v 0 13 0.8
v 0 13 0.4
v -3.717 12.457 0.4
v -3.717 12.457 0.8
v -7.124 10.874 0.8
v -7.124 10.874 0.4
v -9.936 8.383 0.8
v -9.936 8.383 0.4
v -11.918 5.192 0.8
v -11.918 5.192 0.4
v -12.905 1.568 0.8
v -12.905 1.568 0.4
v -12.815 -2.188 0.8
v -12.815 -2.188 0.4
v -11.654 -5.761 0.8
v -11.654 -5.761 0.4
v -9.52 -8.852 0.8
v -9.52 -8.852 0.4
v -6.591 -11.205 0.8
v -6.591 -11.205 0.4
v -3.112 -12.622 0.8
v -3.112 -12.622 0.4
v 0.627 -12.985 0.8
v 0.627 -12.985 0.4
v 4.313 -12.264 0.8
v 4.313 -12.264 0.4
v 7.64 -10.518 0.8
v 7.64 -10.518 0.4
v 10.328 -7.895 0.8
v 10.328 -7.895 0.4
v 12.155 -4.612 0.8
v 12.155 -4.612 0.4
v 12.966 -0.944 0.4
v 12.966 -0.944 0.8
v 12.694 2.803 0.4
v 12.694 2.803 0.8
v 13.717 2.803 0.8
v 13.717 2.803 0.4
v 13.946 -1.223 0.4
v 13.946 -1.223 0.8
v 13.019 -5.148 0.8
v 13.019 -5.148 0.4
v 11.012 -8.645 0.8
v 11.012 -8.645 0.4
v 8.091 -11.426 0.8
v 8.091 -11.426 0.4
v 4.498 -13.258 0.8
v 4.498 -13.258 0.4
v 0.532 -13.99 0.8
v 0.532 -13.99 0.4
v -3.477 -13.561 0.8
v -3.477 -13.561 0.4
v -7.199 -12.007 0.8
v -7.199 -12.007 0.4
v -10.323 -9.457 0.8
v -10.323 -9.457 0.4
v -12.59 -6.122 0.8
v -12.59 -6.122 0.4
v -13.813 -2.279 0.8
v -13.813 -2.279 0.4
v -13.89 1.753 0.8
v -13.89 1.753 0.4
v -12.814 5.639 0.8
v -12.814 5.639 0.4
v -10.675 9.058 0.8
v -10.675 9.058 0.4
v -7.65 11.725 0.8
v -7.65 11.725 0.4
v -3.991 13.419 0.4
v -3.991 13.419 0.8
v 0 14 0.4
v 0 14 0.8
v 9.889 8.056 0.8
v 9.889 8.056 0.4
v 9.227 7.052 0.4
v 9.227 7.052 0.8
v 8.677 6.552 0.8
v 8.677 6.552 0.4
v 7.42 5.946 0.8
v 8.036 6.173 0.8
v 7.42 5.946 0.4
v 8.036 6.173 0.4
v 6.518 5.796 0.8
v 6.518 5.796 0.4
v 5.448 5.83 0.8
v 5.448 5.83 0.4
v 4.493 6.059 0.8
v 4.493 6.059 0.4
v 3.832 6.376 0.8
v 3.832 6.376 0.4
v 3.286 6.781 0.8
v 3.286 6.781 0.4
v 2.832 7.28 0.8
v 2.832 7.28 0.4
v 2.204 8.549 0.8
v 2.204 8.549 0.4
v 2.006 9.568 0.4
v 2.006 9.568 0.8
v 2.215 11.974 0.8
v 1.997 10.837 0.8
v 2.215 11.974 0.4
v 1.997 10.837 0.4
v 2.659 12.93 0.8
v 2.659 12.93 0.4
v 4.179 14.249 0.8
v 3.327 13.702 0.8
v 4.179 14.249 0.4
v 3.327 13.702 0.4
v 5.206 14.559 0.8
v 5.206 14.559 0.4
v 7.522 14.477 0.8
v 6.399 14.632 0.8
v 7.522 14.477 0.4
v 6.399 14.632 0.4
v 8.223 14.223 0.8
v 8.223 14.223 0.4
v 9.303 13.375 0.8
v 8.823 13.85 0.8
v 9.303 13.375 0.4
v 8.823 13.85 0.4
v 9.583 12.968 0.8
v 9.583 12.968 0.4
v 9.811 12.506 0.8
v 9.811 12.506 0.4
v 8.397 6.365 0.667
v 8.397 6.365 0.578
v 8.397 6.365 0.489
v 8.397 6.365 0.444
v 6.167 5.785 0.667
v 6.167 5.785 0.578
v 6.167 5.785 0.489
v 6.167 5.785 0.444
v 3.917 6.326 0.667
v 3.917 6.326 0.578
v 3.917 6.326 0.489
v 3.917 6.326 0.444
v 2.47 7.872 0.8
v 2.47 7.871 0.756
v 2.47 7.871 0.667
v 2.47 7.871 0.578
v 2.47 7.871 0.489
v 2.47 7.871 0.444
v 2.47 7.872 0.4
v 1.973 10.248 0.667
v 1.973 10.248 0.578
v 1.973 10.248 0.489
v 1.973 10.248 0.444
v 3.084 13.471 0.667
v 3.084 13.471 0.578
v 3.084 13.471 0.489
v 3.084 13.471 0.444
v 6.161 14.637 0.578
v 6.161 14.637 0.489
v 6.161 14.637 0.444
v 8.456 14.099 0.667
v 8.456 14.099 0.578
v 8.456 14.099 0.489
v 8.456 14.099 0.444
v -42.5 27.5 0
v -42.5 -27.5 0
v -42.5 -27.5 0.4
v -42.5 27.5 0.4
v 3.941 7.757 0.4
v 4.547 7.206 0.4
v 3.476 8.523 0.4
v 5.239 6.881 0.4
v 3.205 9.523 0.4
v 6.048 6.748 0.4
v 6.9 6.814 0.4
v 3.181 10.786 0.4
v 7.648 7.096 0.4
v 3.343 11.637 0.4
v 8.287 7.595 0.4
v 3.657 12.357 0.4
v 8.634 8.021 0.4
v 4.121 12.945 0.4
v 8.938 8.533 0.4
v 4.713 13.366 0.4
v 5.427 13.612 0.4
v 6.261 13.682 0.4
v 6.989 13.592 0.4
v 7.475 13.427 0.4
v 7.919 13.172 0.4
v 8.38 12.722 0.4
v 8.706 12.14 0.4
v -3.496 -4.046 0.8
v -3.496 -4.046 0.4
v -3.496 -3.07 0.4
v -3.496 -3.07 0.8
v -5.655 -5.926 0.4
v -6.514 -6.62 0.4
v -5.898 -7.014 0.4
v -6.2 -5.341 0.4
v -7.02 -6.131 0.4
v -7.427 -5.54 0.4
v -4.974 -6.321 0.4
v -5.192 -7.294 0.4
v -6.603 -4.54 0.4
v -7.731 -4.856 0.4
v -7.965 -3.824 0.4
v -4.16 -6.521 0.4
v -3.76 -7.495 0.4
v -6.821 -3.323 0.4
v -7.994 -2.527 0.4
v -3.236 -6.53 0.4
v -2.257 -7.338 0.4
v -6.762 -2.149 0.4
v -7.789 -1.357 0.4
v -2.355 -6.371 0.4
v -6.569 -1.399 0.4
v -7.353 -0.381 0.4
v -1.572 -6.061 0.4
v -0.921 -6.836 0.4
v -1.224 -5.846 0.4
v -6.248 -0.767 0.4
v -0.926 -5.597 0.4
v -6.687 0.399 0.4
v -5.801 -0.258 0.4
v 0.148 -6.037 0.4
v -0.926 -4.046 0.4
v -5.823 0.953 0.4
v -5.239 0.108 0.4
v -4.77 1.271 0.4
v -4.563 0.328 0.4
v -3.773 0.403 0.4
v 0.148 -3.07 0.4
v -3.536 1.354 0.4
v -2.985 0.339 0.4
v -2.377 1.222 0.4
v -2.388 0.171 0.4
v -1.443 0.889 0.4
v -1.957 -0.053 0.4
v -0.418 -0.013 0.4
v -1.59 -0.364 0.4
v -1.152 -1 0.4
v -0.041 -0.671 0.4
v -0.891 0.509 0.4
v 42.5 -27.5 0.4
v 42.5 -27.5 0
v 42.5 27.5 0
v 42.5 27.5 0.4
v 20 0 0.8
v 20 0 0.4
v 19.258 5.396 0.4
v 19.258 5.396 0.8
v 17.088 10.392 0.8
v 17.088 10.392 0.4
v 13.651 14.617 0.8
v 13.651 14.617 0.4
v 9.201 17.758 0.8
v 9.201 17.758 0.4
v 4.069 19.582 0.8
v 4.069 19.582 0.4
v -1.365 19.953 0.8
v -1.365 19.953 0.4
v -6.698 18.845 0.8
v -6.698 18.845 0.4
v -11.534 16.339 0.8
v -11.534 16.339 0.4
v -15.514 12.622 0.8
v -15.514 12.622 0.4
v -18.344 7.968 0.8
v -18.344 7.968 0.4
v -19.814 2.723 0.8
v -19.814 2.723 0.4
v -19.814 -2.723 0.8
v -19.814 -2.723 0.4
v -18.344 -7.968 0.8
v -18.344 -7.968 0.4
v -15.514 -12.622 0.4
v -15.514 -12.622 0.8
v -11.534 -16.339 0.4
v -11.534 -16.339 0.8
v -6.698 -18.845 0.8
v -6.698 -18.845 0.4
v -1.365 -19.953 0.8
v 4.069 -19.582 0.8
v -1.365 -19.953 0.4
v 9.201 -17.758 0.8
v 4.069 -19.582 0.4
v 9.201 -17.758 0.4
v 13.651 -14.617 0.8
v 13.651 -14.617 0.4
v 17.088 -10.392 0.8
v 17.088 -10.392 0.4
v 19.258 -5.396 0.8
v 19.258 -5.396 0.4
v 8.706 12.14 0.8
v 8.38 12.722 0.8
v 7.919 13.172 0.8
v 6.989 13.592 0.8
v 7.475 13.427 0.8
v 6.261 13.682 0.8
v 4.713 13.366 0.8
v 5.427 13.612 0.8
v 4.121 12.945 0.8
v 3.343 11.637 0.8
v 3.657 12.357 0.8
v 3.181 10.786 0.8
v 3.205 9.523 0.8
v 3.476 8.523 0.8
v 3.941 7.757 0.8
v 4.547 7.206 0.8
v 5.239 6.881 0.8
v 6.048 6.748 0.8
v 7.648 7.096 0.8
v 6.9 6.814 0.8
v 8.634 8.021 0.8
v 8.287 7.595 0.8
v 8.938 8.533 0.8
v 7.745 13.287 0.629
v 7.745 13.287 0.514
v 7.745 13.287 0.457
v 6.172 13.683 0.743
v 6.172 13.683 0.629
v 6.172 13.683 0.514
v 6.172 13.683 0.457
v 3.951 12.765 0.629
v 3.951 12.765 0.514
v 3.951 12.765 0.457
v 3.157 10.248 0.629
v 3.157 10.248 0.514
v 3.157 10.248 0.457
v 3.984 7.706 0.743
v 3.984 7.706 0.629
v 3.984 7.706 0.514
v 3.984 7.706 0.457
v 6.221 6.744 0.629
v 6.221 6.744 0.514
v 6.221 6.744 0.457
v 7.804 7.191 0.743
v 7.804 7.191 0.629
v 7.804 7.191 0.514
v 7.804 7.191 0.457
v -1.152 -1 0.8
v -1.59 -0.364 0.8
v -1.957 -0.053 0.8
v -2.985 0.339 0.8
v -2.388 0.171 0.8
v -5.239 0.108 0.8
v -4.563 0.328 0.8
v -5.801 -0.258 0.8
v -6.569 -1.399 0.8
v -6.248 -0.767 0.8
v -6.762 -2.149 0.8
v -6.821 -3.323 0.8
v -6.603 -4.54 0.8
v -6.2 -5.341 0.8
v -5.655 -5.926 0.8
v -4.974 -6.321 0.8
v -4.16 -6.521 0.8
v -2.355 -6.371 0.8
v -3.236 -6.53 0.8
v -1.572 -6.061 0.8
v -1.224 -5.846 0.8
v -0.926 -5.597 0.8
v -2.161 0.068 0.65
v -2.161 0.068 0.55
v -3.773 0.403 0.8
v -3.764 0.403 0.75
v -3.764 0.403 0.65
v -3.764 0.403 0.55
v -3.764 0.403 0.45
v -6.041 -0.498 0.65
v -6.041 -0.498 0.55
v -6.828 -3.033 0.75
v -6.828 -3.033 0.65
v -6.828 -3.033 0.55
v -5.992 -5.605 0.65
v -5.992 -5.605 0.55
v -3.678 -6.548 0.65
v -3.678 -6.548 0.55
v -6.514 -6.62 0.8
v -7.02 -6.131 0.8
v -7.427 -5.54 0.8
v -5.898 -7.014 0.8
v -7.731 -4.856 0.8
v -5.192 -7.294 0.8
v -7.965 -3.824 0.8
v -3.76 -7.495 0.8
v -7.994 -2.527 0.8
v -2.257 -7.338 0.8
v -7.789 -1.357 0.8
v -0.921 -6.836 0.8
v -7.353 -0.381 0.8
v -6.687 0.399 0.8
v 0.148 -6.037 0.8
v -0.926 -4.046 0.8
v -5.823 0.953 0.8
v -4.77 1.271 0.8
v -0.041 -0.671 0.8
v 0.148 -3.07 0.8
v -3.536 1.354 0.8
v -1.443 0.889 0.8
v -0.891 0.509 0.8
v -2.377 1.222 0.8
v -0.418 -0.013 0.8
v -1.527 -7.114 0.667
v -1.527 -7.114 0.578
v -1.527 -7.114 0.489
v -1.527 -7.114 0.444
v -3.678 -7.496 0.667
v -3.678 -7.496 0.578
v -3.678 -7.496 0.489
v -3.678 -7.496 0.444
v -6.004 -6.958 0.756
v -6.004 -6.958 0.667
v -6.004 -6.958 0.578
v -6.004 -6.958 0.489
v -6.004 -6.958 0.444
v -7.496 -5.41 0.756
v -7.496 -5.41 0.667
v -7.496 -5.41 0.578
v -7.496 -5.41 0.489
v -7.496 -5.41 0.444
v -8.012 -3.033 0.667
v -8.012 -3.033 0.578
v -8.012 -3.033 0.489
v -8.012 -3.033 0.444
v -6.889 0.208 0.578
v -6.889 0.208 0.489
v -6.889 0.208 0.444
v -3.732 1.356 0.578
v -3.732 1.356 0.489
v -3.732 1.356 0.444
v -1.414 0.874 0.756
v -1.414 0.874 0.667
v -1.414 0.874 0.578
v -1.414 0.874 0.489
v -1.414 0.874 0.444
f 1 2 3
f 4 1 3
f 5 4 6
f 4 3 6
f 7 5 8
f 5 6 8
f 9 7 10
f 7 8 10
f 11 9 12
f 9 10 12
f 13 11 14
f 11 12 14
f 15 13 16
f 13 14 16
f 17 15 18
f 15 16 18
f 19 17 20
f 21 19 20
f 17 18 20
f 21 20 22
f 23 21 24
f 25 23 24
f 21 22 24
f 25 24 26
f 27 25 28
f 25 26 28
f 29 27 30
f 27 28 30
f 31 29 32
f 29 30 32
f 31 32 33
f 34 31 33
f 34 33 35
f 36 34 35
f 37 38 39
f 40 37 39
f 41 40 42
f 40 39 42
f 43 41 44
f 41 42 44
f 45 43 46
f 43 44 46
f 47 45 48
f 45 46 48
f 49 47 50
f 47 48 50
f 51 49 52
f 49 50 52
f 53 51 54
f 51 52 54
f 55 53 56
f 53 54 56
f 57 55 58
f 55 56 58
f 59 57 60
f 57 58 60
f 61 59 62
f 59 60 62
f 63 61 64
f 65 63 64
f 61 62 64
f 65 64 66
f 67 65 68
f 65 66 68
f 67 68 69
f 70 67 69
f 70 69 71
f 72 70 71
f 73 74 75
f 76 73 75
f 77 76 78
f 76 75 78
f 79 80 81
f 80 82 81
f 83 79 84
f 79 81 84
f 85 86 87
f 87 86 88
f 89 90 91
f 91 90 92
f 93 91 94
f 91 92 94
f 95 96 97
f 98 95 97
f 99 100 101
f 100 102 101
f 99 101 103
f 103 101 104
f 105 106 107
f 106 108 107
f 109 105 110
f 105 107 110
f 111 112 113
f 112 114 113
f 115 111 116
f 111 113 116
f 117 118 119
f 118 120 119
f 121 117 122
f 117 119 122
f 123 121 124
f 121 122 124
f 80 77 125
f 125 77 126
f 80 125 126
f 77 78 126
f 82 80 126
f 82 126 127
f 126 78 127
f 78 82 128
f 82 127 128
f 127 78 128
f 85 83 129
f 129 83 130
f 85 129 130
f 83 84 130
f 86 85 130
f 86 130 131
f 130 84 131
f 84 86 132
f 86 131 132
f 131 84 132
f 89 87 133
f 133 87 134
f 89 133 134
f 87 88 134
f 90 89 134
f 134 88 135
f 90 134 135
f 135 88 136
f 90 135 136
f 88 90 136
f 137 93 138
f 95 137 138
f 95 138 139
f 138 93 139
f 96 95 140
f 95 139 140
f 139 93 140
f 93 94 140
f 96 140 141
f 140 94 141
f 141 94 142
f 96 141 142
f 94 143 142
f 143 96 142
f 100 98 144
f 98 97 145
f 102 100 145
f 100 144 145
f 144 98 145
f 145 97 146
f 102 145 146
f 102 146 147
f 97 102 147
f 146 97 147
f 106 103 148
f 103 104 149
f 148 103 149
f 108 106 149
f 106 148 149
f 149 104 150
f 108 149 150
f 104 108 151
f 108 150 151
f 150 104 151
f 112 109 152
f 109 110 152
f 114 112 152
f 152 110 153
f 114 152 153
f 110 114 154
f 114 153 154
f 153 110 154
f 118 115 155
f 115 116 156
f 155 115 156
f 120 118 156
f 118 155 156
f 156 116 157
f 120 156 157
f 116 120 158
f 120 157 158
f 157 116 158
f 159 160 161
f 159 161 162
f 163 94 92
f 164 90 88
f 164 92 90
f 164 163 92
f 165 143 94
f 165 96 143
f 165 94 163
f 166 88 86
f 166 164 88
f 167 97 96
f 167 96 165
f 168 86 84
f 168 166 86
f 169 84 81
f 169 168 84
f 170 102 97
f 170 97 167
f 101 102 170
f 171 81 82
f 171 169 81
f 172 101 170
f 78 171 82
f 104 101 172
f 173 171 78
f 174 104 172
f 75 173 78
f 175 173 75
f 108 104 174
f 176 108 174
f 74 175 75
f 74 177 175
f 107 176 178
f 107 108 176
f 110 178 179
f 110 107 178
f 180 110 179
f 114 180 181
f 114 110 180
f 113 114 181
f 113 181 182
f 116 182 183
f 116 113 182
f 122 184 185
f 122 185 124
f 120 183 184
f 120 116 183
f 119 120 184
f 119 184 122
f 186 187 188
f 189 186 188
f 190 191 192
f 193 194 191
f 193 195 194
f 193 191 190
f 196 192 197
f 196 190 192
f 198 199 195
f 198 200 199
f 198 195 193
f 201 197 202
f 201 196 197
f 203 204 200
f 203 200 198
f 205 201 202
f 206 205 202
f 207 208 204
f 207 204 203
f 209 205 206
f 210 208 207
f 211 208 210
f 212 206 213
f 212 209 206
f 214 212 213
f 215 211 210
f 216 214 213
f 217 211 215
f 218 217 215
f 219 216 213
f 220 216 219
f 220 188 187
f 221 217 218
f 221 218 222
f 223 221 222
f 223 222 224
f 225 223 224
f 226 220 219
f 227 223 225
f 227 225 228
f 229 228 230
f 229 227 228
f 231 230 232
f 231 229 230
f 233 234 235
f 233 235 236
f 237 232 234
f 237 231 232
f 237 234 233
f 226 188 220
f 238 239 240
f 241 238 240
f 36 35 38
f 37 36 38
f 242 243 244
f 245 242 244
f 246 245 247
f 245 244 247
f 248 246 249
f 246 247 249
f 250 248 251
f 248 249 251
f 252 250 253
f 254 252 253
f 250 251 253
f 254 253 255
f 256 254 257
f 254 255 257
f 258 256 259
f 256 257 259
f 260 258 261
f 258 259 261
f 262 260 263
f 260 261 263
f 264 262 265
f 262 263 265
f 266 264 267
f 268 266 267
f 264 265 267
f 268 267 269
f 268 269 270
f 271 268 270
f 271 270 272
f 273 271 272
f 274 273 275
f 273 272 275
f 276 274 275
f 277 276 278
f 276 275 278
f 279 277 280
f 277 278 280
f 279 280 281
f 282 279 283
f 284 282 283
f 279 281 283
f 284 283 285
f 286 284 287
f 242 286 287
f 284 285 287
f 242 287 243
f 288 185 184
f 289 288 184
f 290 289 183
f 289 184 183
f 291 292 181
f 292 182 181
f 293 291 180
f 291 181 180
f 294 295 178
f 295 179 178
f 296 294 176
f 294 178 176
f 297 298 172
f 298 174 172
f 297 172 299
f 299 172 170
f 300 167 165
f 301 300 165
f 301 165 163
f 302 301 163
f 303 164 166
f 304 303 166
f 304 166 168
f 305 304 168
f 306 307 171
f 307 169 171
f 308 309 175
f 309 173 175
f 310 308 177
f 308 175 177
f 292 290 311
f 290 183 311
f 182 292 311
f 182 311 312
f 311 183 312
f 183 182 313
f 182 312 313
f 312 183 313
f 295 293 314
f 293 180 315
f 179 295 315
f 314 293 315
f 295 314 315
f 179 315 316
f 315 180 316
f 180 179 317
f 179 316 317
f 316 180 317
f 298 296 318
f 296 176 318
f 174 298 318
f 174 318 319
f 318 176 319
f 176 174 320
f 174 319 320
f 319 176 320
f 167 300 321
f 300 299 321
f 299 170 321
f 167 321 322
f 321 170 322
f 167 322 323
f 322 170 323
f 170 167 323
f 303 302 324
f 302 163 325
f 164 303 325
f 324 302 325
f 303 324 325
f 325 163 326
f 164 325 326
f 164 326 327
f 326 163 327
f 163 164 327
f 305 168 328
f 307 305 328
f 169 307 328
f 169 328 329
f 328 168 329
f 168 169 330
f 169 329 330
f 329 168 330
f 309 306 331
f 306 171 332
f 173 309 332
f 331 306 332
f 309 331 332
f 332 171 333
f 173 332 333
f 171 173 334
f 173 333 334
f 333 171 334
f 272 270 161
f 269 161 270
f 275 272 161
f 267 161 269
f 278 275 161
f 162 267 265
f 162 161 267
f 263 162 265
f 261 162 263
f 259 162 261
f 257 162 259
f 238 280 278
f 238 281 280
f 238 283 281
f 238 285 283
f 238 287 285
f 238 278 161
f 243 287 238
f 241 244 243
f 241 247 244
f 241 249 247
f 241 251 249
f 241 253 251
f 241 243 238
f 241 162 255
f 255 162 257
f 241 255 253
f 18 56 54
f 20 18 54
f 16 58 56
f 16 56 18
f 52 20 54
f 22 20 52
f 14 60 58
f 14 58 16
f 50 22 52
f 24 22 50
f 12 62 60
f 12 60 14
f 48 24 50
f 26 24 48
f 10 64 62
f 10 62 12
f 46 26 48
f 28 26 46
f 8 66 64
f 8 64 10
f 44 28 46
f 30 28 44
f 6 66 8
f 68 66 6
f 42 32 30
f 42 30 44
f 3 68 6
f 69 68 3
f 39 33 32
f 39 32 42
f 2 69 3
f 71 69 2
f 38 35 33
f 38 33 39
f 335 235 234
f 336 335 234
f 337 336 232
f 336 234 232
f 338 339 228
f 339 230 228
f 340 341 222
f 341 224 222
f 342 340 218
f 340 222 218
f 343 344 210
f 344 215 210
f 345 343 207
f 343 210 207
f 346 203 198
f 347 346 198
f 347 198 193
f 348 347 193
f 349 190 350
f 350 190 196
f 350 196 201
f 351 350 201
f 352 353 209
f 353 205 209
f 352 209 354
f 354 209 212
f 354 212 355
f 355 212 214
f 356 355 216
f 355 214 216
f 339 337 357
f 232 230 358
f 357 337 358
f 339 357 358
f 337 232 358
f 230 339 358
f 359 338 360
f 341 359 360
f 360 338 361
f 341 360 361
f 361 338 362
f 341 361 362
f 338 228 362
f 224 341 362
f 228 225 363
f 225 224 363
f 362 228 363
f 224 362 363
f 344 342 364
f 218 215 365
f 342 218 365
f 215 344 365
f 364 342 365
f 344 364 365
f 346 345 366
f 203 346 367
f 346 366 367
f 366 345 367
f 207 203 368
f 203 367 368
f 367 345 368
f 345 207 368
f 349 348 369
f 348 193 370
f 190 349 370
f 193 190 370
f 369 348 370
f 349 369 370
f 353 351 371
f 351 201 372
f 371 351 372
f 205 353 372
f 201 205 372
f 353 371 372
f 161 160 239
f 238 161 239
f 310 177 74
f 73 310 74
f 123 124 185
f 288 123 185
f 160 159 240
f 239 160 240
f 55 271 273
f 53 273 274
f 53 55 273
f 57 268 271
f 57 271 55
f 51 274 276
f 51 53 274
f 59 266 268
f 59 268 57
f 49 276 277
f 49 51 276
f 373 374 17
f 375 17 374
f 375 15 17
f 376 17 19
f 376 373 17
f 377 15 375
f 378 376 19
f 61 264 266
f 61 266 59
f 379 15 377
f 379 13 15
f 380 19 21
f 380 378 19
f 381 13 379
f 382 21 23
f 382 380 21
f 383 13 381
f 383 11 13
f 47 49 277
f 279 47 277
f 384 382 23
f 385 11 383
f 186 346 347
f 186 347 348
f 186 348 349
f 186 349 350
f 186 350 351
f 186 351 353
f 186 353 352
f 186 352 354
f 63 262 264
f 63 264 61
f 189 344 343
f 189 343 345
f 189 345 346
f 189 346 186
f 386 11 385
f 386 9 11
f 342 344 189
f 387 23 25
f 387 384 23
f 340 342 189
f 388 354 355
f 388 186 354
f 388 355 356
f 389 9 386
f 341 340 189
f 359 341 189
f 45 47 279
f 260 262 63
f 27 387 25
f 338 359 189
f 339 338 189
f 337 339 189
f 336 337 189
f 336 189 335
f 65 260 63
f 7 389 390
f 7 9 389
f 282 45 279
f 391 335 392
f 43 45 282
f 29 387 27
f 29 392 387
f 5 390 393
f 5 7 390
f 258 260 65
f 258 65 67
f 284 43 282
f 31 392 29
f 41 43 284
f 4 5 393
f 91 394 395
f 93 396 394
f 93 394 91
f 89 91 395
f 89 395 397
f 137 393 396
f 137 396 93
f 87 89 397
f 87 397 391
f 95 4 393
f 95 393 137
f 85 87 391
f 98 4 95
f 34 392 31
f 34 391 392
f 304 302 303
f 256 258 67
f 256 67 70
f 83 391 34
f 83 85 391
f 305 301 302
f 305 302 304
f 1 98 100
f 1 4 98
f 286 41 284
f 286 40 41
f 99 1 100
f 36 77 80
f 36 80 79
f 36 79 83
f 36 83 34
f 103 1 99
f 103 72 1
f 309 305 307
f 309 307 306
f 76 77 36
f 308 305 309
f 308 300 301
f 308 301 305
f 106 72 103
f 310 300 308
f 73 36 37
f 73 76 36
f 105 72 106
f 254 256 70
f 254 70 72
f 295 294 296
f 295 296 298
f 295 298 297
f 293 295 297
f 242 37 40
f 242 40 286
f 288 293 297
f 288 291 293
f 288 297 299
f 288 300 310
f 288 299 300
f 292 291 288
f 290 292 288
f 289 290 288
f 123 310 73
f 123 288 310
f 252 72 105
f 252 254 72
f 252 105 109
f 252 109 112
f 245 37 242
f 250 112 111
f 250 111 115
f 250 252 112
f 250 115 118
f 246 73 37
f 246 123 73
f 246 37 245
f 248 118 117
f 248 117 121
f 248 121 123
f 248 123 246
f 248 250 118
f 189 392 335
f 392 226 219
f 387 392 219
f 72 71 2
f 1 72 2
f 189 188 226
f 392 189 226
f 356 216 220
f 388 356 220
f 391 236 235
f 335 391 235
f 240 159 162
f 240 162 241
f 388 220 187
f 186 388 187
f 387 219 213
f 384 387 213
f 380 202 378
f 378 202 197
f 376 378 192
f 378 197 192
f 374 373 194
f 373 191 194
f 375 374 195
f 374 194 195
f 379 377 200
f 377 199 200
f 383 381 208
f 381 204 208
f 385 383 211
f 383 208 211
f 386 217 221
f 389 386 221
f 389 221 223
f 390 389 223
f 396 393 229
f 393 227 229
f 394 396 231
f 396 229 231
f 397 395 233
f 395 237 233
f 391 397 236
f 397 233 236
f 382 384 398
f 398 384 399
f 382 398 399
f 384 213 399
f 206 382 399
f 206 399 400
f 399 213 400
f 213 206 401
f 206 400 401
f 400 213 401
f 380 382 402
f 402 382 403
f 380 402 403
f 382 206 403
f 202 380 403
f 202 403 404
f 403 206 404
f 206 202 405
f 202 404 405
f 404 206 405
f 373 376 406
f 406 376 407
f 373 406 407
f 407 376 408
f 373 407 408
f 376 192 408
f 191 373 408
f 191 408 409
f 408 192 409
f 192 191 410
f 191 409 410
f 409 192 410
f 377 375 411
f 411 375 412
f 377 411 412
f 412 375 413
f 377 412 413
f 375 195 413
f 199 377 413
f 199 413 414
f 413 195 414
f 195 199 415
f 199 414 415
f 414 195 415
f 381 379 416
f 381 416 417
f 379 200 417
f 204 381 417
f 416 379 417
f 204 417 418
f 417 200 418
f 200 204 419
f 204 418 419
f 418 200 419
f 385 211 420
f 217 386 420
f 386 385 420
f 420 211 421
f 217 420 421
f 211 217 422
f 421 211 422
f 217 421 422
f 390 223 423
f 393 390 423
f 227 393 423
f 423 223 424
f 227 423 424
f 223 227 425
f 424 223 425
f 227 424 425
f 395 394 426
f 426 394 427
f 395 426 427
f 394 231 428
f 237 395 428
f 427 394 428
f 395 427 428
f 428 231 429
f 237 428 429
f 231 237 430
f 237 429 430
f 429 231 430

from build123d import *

# Parameters (mm, degrees)
F0_W     = 85
F0_H     = 55
F1_DEPTH = 0.4
F2_R     = 20
F3_DEPTH = 0.4


with BuildPart() as f1:
    # F0 (on Top) → F1 (new body)
    with BuildSketch(Plane.XY):
        Rectangle(F0_W, F0_H)
    extrude(amount=F1_DEPTH)

    # F2 (on face) → F3 (join)
    with BuildSketch(Plane.XY.offset(0.4)):
        Circle(F2_R)
        with BuildLine():
            add(Edge.make_bspline(
                [(-7.4961080118, -5.409697216), (-8.0117330118, -4.399931591), (-8.0117330118, -3.032744091)],
                knots=[0, 0, 0, 1, 1, 1], degree=2))
            add(Edge.make_bspline(
                [(-8.0117330118, -3.032744091), (-8.0117330118, -0.938994091), (-6.8886861368, 0.2084668465)],
                knots=[0, 0, 0, 1, 1, 1], degree=2))
            add(Edge.make_bspline(
                [(-6.8886861368, 0.2084668465), (-5.7656392618, 1.355927784), (-3.7324361368, 1.355927784)],
                knots=[0, 0, 0, 1, 1, 1], degree=2))
            add(Edge.make_bspline(
                [(-3.7324361368, 1.355927784), (-2.3047017618, 1.355927784), (-1.4140767618, 0.873505909)],
                knots=[0, 0, 0, 1, 1, 1], degree=2))
            add(Edge.make_bspline(
                [(-1.4140767618, 0.873505909), (-0.5234517618, 0.391084034), (-0.0410298868, -0.671415966)],
                knots=[0, 0, 0, 1, 1, 1], degree=2))
            Line((-0.0410298868, -0.671415966), (-1.1523580118, -0.999540966))
            add(Edge.make_bspline(
                [(-1.1523580118, -0.999540966), (-1.5175923868, -0.267119091), (-2.1611470743, 0.0678418465)],
                knots=[0, 0, 0, 1, 1, 1], degree=2))
            add(Edge.make_bspline(
                [(-2.1611470743, 0.0678418465), (-2.8047017618, 0.402802784), (-3.7636861368, 0.402802784)],
                knots=[0, 0, 0, 1, 1, 1], degree=2))
            add(Edge.make_bspline(
                [(-3.7636861368, 0.402802784), (-5.2539205118, 0.402802784), (-6.0410298868, -0.497587841)],
                knots=[0, 0, 0, 1, 1, 1], degree=2))
            add(Edge.make_bspline(
                [(-6.0410298868, -0.497587841), (-6.8281392618, -1.397978466), (-6.8281392618, -3.032744091)],
                knots=[0, 0, 0, 1, 1, 1], degree=2))
            add(Edge.make_bspline(
                [(-6.8281392618, -3.032744091), (-6.8281392618, -4.661650341), (-5.9922017618, -5.605009716)],
                knots=[0, 0, 0, 1, 1, 1], degree=2))
            add(Edge.make_bspline(
                [(-5.9922017618, -5.605009716), (-5.1562642618, -6.548369091), (-3.6777486368, -6.548369091)],
                knots=[0, 0, 0, 1, 1, 1], degree=2))
            add(Edge.make_bspline(
                [(-3.6777486368, -6.548369091), (-2.8359517618, -6.548369091), (-2.1064595743, -6.292509716)],
                knots=[0, 0, 0, 1, 1, 1], degree=2))
            add(Edge.make_bspline(
                [(-2.1064595743, -6.292509716), (-1.3769673868, -6.036650341), (-0.9257955118, -5.597197216)],
                knots=[0, 0, 0, 1, 1, 1], degree=2))
            Line((-0.9257955118, -5.597197216), (-0.9257955118, -4.046415966))
            Line((-0.9257955118, -4.046415966), (-3.4961080118, -4.046415966))
            Line((-3.4961080118, -4.046415966), (-3.4961080118, -3.069853466))
            Line((-3.4961080118, -3.069853466), (0.1484232382, -3.069853466))
            Line((0.1484232382, -3.069853466), (0.1484232382, -6.036650341))
            add(Edge.make_bspline(
                [(0.1484232382, -6.036650341), (-0.5351705118, -6.731962841), (-1.5273580118, -7.1137987785)],
                knots=[0, 0, 0, 1, 1, 1], degree=2))
            add(Edge.make_bspline(
                [(-1.5273580118, -7.1137987785), (-2.5195455118, -7.495634716), (-3.6777486368, -7.495634716)],
                knots=[0, 0, 0, 1, 1, 1], degree=2))
            add(Edge.make_bspline(
                [(-3.6777486368, -7.495634716), (-5.0273580118, -7.495634716), (-6.0039205118, -6.9575487785)],
                knots=[0, 0, 0, 1, 1, 1], degree=2))
            add(Edge.make_bspline(
                [(-6.0039205118, -6.9575487785), (-6.9804830118, -6.419462841), (-7.4961080118, -5.409697216)],
                knots=[0, 0, 0, 1, 1, 1], degree=2))
        make_face(mode=Mode.SUBTRACT)
        with BuildLine():
            ThreePointArc((13.716509354, 2.803100273), (-8.8531518731, -10.845353932), (0, 14))
            Line((0, 14), (0, 13))
            ThreePointArc((0, 13), (-8.1412436535, -10.135095055), (12.6941966607, 2.803100273))
            Line((12.6941966607, 2.803100273), (13.716509354, 2.803100273))
        make_face(mode=Mode.SUBTRACT)
        with BuildLine():
            add(Edge.make_bspline(
                [(7.744643158, 13.2869364135), (7.082533783, 13.6834207885), (6.172377533, 13.6834207885)],
                knots=[0, 0, 0, 1, 1, 1], degree=2))
            add(Edge.make_bspline(
                [(6.172377533, 13.6834207885), (4.744643158, 13.6834207885), (3.9506978455, 12.7654520385)],
                knots=[0, 0, 0, 1, 1, 1], degree=2))
            add(Edge.make_bspline(
                [(3.9506978455, 12.7654520385), (3.156752533, 11.8474832885), (3.156752533, 10.2478739135)],
                knots=[0, 0, 0, 1, 1, 1], degree=2))
            add(Edge.make_bspline(
                [(3.156752533, 10.2478739135), (3.156752533, 8.6677957885), (3.9839009705, 7.705881726)],
                knots=[0, 0, 0, 1, 1, 1], degree=2))
            add(Edge.make_bspline(
                [(3.9839009705, 7.705881726), (4.811049408, 6.7439676635), (6.221205658, 6.7439676635)],
                knots=[0, 0, 0, 1, 1, 1], degree=2))
            add(Edge.make_bspline(
                [(6.221205658, 6.7439676635), (8.027846283, 6.7439676635), (8.938002533, 8.5330301635)],
                knots=[0, 0, 0, 1, 1, 1], degree=2))
            Line((8.938002533, 8.5330301635), (9.889174408, 8.0564676635))
            add(Edge.make_bspline(
                [(9.889174408, 8.0564676635), (9.357924408, 6.9451395385), (8.396986908, 6.3650614135)],
                knots=[0, 0, 0, 1, 1, 1], degree=2))
            add(Edge.make_bspline(
                [(8.396986908, 6.3650614135), (7.436049408, 5.7849832885), (6.166518158, 5.7849832885)],
                knots=[0, 0, 0, 1, 1, 1], degree=2))
            add(Edge.make_bspline(
                [(6.166518158, 5.7849832885), (4.865736908, 5.7849832885), (3.916518158, 6.3259989135)],
                knots=[0, 0, 0, 1, 1, 1], degree=2))
            add(Edge.make_bspline(
                [(3.916518158, 6.3259989135), (2.967299408, 6.8670145385), (2.4702290955, 7.8709207885)],
                knots=[0, 0, 0, 1, 1, 1], degree=2))
            add(Edge.make_bspline(
                [(2.4702290955, 7.8709207885), (1.973158783, 8.8748270385), (1.973158783, 10.2478739135)],
                knots=[0, 0, 0, 1, 1, 1], degree=2))
            add(Edge.make_bspline(
                [(1.973158783, 10.2478739135), (1.973158783, 12.3045145385), (3.084486908, 13.4705301635)],
                knots=[0, 0, 0, 1, 1, 1], degree=2))
            add(Edge.make_bspline(
                [(3.084486908, 13.4705301635), (4.195815033, 14.6365457885), (6.160658783, 14.6365457885)],
                knots=[0, 0, 0, 1, 1, 1], degree=2))
            add(Edge.make_bspline(
                [(6.160658783, 14.6365457885), (7.533705658, 14.6365457885), (8.455580658, 14.0994364135)],
                knots=[0, 0, 0, 1, 1, 1], degree=2))
            add(Edge.make_bspline(
                [(8.455580658, 14.0994364135), (9.377455658, 13.5623270385), (9.811049408, 12.5056864135)],
                knots=[0, 0, 0, 1, 1, 1], degree=2))
            Line((9.811049408, 12.5056864135), (8.705580658, 12.1404520385))
            add(Edge.make_bspline(
                [(8.705580658, 12.1404520385), (8.406752533, 12.8904520385), (7.744643158, 13.2869364135)],
                knots=[0, 0, 0, 1, 1, 1], degree=2))
        make_face(mode=Mode.SUBTRACT)
    extrude(amount=F3_DEPTH)


solid = f1.part
